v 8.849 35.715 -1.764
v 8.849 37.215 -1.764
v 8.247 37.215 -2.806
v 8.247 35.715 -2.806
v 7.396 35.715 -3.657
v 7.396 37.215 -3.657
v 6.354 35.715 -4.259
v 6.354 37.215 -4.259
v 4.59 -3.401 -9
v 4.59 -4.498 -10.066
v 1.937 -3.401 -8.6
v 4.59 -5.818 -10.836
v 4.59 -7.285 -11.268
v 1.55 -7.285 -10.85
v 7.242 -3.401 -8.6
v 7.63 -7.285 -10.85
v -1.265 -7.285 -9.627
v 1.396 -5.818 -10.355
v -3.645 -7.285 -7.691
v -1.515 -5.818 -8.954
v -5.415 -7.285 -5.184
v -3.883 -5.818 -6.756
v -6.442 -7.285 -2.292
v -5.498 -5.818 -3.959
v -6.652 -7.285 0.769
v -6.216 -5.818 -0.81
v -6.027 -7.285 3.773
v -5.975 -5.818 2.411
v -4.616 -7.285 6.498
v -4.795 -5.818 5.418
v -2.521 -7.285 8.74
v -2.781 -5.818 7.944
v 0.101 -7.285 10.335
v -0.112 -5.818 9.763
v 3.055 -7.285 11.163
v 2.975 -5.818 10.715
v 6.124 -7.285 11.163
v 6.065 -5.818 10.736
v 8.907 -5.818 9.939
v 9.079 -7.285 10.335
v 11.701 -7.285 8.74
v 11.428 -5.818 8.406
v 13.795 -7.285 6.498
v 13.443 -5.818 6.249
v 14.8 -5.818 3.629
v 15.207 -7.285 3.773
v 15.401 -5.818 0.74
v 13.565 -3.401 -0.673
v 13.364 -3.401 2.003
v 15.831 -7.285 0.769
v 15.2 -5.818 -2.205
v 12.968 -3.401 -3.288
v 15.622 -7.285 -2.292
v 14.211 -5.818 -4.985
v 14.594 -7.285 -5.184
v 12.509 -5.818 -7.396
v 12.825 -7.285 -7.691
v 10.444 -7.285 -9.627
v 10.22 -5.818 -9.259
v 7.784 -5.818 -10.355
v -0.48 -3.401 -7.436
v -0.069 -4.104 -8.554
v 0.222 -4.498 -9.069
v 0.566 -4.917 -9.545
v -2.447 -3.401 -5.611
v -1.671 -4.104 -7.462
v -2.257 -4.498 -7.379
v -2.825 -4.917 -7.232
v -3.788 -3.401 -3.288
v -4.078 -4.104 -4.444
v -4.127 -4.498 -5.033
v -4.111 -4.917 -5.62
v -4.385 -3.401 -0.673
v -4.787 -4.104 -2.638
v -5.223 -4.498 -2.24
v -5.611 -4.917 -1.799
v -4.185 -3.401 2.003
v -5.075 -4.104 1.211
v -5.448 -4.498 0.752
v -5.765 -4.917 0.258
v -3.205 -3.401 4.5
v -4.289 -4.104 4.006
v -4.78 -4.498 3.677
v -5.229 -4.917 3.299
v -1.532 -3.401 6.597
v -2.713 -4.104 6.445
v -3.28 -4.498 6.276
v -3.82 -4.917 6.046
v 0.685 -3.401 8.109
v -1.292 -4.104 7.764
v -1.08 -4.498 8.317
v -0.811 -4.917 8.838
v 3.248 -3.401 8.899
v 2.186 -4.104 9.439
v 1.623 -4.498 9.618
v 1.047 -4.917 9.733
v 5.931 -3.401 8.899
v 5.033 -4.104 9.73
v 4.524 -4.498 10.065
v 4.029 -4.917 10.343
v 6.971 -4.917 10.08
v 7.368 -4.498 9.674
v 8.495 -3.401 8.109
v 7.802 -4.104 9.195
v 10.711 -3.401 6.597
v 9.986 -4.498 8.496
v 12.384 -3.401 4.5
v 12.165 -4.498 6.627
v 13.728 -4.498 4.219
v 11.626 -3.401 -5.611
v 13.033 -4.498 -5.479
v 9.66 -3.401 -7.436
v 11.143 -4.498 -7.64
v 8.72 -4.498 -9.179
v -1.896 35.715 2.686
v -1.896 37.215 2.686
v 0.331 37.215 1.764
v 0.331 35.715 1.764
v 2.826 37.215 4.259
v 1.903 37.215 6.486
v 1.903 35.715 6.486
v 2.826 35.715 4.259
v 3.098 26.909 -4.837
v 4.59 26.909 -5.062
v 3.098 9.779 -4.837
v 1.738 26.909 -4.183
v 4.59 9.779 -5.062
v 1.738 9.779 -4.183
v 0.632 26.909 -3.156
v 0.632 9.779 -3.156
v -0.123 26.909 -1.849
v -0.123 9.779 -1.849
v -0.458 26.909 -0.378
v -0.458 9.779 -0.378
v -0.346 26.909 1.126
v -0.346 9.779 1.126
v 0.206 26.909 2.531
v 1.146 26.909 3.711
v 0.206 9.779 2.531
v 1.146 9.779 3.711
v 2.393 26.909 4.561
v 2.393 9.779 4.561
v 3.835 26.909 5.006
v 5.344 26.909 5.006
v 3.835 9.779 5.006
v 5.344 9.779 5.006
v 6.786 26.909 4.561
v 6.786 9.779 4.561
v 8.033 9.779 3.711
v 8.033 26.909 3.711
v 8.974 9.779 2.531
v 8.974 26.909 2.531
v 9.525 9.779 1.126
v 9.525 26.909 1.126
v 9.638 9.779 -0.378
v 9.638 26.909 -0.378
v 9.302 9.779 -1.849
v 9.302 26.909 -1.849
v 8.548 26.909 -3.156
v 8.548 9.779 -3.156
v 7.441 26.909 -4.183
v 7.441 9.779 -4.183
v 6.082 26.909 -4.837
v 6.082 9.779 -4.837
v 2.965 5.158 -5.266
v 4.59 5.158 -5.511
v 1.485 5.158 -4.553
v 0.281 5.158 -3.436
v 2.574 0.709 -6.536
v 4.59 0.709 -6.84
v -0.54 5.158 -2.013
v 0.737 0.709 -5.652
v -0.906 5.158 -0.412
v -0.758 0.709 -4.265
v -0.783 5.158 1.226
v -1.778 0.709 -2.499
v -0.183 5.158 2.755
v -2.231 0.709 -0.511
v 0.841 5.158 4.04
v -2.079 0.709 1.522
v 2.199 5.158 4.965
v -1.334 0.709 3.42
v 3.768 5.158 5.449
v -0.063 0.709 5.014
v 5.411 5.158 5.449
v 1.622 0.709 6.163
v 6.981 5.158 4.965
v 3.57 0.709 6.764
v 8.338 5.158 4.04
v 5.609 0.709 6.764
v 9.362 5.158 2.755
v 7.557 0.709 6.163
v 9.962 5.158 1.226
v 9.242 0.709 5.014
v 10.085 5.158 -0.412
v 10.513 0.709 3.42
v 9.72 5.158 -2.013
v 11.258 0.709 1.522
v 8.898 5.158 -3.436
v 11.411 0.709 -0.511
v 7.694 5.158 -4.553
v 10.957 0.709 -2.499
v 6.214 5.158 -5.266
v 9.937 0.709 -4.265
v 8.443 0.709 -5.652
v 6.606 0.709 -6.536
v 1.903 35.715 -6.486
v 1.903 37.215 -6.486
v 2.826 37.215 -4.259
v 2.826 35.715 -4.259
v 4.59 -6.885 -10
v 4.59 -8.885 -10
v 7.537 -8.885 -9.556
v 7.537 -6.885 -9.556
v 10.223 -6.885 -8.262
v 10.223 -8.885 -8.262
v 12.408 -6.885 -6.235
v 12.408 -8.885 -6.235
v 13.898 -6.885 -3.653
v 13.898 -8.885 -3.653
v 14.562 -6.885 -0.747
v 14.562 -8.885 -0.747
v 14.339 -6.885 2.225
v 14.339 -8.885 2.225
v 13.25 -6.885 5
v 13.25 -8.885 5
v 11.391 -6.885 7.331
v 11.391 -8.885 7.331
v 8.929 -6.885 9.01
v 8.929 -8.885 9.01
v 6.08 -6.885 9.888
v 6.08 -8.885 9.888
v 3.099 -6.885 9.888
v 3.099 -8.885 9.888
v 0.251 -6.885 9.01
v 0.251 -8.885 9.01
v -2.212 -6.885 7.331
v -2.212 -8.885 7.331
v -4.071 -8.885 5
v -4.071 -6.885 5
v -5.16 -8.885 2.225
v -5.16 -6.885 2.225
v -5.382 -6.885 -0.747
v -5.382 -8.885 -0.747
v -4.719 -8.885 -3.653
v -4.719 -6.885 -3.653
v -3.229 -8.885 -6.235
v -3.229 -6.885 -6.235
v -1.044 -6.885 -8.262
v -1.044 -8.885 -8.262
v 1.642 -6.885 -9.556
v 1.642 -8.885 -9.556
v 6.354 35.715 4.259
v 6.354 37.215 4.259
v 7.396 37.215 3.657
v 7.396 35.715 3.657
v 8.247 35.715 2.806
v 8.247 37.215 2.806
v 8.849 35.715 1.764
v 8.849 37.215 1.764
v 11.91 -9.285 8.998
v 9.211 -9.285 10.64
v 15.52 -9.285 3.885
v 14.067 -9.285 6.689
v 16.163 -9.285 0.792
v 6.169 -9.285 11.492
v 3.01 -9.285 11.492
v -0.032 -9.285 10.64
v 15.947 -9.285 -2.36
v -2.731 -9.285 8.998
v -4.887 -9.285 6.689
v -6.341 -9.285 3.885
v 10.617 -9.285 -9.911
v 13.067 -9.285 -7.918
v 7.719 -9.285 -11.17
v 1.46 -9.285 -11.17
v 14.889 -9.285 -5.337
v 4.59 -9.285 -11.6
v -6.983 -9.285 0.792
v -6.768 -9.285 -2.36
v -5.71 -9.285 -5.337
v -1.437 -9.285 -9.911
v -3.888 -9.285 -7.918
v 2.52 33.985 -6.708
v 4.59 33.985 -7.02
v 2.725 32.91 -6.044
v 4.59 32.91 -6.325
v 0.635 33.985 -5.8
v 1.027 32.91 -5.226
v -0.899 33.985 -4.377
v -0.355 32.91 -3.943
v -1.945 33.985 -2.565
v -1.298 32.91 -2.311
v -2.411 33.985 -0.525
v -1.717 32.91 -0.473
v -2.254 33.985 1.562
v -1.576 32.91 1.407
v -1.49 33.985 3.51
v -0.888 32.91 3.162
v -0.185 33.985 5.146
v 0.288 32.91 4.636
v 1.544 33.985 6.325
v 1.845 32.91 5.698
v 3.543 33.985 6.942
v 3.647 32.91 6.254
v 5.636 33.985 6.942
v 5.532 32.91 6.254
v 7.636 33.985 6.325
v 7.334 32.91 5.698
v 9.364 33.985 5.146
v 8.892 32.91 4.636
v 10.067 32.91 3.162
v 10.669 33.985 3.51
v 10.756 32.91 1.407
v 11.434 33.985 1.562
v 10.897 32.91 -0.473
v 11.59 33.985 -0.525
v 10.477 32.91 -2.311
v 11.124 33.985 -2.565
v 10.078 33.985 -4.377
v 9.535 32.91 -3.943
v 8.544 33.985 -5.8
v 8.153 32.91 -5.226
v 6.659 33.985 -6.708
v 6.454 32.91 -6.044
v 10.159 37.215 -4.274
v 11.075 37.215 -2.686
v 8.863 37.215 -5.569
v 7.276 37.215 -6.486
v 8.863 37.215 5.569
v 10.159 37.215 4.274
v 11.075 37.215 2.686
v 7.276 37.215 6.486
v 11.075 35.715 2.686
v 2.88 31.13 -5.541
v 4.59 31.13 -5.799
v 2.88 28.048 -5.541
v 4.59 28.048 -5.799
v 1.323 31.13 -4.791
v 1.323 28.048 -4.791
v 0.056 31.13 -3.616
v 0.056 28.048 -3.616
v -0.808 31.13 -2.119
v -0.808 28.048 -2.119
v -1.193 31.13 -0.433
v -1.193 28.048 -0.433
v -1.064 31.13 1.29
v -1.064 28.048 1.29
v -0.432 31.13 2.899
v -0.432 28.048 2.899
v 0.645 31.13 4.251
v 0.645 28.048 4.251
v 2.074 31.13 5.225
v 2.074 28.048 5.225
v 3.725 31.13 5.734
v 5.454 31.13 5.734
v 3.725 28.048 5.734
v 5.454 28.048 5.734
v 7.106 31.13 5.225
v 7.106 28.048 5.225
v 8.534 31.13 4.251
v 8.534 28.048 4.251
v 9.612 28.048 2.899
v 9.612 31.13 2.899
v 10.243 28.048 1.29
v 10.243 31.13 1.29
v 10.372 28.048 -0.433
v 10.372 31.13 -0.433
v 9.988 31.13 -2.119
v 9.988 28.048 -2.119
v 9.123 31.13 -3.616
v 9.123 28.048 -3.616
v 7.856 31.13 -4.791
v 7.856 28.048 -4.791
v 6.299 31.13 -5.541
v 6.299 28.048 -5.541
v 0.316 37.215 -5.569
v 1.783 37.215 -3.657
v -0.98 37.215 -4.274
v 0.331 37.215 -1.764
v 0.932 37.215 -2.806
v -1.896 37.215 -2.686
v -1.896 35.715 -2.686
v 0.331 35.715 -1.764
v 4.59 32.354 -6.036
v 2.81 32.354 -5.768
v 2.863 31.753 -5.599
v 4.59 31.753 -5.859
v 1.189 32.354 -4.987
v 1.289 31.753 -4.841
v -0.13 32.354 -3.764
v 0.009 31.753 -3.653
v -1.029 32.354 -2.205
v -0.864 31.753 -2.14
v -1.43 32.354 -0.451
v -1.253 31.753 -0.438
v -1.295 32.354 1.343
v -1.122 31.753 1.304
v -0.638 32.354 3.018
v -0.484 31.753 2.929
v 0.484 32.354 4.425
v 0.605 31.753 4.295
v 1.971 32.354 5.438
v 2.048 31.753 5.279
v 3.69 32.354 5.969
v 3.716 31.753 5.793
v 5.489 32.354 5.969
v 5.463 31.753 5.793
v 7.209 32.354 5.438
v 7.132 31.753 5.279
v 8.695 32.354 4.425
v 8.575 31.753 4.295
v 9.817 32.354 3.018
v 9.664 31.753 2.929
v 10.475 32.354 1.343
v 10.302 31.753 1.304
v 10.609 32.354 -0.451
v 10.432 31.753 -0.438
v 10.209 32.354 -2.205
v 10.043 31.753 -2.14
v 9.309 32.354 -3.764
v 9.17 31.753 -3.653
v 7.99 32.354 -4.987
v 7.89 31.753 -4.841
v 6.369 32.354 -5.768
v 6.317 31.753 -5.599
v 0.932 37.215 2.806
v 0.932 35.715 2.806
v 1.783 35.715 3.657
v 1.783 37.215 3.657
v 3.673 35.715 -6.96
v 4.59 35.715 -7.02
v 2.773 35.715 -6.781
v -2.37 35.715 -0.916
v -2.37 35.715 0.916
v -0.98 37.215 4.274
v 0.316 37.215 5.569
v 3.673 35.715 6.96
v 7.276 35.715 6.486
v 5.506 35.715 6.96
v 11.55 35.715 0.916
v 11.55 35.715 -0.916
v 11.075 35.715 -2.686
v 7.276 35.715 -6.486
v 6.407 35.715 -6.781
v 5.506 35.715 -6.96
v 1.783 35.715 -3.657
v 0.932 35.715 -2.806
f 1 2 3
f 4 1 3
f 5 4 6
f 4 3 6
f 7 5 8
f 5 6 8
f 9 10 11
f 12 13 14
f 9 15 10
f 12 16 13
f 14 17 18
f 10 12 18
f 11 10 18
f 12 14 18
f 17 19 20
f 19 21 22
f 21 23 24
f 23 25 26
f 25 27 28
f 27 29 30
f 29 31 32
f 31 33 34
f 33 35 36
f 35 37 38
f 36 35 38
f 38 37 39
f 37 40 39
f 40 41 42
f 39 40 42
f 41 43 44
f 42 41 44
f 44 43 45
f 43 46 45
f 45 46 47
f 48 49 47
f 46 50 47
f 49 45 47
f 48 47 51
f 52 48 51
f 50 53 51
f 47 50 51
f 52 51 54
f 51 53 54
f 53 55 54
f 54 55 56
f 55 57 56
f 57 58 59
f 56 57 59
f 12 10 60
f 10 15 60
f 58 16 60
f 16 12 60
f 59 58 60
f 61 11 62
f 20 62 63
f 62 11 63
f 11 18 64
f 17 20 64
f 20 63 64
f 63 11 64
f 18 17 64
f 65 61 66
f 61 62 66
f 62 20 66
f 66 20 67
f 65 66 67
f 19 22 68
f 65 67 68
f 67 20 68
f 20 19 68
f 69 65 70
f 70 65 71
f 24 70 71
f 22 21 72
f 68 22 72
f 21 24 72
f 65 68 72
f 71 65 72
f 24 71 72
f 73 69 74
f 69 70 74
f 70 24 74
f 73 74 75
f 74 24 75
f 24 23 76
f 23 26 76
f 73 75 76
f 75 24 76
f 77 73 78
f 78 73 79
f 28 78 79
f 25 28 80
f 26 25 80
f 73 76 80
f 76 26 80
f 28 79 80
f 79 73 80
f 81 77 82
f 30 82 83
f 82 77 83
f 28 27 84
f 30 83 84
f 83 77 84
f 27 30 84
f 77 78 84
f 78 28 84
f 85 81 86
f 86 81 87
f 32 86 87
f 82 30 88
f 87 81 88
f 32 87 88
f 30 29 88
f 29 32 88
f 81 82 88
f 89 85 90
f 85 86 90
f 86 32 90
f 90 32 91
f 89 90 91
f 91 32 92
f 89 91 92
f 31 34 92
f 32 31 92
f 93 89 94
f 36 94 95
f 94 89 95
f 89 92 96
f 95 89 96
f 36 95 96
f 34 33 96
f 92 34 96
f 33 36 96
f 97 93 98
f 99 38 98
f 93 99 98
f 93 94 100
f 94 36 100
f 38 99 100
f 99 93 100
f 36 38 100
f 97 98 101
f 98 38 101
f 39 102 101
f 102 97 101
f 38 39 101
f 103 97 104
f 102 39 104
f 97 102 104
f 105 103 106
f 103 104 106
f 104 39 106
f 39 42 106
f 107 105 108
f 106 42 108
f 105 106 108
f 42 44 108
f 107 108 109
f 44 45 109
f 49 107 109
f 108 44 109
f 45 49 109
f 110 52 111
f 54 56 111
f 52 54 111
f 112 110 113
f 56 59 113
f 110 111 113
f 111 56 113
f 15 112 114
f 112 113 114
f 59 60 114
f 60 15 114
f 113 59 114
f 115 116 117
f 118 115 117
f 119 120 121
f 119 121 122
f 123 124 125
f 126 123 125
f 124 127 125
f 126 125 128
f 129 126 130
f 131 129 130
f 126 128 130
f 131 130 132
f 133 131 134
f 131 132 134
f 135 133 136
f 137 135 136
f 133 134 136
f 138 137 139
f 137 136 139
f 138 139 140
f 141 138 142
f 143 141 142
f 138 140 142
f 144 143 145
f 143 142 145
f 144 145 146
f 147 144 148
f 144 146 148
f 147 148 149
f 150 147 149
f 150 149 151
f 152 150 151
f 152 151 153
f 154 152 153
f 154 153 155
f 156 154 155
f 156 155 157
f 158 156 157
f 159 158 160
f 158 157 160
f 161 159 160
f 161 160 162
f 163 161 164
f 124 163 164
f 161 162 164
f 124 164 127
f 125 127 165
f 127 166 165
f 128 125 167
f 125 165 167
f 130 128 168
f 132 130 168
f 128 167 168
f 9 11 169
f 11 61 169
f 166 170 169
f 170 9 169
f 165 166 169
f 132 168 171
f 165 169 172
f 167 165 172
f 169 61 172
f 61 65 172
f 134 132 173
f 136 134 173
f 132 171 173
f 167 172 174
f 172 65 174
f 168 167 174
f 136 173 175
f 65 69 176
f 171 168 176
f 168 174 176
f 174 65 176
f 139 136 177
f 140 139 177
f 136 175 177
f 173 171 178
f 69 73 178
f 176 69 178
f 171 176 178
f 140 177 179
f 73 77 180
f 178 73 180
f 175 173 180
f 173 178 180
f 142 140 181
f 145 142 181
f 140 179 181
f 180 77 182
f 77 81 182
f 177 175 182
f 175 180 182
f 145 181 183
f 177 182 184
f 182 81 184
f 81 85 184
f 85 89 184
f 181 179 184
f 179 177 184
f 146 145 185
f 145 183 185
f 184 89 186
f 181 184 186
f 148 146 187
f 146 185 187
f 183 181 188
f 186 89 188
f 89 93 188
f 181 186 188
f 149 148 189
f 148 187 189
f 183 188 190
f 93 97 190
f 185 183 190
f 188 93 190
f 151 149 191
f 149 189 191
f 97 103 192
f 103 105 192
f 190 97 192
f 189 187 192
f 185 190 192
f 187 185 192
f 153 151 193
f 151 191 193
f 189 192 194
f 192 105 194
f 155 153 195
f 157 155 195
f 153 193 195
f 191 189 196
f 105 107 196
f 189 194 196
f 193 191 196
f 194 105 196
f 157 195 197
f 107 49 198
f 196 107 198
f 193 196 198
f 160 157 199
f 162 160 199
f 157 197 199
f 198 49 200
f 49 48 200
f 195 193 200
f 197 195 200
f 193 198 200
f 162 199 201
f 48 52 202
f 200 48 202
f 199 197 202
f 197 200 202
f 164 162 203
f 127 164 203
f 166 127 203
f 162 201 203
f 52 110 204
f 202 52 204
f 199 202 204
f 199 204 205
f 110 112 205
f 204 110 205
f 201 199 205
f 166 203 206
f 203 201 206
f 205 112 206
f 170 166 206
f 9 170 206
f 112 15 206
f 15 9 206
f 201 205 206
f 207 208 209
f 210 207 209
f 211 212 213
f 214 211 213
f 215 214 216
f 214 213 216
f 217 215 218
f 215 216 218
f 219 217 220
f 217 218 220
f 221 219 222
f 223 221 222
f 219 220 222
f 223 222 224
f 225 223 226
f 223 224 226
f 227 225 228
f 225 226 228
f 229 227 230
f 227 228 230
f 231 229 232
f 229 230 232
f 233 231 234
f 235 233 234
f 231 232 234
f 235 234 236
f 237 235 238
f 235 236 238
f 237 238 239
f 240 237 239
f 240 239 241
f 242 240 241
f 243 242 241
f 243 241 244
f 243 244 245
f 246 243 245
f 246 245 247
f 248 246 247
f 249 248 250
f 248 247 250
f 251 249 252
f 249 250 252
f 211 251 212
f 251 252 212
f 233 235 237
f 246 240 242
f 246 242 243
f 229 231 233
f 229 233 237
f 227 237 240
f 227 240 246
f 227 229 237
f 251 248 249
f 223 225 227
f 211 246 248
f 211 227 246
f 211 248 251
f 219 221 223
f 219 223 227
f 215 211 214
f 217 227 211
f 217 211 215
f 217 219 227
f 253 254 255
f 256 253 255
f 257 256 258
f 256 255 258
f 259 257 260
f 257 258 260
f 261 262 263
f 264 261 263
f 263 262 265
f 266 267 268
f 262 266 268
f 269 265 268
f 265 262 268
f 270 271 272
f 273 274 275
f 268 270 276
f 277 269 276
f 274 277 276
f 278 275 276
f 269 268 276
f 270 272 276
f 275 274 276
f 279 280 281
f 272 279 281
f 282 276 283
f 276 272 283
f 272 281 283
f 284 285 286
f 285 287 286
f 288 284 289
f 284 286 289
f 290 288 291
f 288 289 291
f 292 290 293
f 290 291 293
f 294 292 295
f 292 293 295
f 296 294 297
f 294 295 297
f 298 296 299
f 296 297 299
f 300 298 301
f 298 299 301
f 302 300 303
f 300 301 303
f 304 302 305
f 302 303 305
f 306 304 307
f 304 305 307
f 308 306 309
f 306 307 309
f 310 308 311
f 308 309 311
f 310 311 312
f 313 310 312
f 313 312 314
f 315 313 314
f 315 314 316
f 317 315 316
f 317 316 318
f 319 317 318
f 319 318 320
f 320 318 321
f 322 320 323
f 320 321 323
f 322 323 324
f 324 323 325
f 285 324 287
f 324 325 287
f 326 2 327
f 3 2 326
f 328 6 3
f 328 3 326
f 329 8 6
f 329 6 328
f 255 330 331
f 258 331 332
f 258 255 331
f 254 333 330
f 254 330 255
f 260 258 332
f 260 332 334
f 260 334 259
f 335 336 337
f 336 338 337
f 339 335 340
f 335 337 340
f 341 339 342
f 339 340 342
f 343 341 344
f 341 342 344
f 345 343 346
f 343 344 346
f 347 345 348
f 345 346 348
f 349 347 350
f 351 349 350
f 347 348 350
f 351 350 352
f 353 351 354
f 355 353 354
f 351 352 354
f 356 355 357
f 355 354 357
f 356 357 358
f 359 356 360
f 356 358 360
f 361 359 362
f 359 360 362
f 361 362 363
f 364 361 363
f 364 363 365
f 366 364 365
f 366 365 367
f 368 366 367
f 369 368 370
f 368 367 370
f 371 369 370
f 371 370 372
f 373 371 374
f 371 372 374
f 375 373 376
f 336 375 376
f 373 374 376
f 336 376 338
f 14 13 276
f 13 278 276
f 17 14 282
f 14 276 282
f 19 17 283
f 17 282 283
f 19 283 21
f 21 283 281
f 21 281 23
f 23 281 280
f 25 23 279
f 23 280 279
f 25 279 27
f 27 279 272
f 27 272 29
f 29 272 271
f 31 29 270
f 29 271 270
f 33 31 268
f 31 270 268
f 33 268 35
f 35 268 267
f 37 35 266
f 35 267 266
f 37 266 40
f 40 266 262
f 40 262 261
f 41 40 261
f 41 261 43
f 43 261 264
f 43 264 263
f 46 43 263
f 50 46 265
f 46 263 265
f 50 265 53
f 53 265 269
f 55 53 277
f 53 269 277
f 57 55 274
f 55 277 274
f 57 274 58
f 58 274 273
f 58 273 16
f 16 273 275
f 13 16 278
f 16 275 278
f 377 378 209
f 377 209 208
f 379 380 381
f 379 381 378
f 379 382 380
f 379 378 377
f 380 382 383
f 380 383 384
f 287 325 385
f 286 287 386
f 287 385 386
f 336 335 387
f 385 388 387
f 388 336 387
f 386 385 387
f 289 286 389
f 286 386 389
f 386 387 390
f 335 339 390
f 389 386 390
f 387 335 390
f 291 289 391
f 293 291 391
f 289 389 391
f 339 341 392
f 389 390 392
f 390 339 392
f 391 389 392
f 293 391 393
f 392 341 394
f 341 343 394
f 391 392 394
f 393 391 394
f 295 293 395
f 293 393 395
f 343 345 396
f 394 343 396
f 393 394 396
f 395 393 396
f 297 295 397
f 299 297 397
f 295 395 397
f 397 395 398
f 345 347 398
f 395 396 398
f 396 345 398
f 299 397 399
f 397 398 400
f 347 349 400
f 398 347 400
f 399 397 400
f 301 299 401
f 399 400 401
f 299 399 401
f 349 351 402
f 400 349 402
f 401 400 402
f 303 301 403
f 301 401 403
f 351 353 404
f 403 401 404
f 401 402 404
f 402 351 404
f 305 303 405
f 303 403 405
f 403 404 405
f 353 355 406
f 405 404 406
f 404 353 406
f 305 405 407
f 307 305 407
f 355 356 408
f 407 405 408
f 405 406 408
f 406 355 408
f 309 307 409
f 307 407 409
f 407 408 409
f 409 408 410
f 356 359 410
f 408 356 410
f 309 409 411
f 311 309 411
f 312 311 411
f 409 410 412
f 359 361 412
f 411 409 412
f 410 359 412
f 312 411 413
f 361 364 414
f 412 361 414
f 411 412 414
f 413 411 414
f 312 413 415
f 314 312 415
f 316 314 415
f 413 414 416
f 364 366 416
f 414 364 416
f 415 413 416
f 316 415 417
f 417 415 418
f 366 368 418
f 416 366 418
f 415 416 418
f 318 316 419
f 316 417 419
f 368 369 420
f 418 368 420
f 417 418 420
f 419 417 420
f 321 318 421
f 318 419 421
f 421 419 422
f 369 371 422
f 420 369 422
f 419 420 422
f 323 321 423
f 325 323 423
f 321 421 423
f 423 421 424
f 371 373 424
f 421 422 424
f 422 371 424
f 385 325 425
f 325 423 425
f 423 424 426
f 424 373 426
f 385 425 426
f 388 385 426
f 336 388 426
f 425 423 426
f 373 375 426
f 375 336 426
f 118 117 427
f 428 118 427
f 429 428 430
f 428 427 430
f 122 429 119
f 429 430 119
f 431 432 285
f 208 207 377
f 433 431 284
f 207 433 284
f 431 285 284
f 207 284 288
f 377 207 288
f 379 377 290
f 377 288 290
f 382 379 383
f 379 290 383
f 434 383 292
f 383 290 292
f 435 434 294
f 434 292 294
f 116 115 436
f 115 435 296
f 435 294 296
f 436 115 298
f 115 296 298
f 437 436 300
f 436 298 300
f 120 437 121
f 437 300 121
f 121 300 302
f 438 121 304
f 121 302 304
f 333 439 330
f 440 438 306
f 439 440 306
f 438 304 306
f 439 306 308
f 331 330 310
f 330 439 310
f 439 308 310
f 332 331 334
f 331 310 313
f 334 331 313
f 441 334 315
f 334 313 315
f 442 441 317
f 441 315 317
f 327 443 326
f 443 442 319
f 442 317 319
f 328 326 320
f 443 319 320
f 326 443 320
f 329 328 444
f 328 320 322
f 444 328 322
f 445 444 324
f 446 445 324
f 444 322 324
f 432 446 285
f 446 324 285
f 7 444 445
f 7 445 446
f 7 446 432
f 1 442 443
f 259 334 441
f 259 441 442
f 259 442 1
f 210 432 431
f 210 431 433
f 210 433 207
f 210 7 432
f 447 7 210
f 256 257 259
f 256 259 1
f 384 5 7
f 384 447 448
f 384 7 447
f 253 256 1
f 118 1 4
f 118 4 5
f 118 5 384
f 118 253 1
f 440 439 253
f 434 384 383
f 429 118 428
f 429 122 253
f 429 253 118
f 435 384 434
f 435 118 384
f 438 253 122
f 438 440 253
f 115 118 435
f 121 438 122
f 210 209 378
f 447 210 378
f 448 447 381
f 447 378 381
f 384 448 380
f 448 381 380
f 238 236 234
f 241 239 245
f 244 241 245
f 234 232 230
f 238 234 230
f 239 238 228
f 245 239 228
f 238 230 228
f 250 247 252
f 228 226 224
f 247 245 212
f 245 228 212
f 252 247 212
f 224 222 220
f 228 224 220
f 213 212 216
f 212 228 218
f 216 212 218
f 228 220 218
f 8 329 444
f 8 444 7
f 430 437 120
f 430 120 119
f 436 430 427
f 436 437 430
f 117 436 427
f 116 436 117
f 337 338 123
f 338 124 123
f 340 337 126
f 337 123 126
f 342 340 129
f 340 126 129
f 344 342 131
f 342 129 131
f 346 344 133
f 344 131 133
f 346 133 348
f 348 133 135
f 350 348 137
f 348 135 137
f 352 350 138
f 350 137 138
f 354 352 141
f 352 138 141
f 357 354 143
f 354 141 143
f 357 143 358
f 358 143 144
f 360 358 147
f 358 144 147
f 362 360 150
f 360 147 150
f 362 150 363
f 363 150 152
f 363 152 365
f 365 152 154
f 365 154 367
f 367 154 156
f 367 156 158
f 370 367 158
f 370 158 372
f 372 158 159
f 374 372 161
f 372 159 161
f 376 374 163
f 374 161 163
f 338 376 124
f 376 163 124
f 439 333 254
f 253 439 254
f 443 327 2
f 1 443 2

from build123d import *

# Parameters (mm, degrees)
SKETCH1_3_W        = 2.41
SKETCH1_3_H        = 1.5
CUT_REVOLVE1_ANGLE = 45
CIRPATTERN1_COUNT  = 4
CUT_EXTRUDE1_START = -0.4
SKETCH2_R          = 10
CUT_EXTRUDE1_DEPTH = 2


with BuildPart() as part:
    # Sketch1 → Revolve5 (revolve)
    with BuildSketch(Plane.XY):
        with BuildLine():
            Line((-7.010318738, -9.284917782), (4.589681262, -9.284917782))
            Line((4.589681262, -9.284917782), (4.589681262, 35.715082218))
            Line((4.589681262, 35.715082218), (-0.020318738, 35.715082218))
            Line((-0.020318738, 35.715082218), (-0.020318738, 37.215082218))
            Line((-0.020318738, 37.215082218), (-2.430318738, 37.215082218))
            Line((-2.430318738, 37.215082218), (-2.430318738, 33.985082218))
            Line((-2.430318738, 33.985082218), (-1.735040384, 32.910378534))
            ThreePointArc((-1.735040384, 32.910378534), (-1.343438221, 32.058018495), (-1.209241973, 31.129653665))
            Line((-1.209241973, 31.129653665), (-1.209241973, 28.047788417))
            Line((-1.209241973, 28.047788417), (-0.472655293, 26.909233745))
            Line((-0.472655293, 26.909233745), (-0.472655293, 9.778863627))
            ThreePointArc((-0.472655293, 9.778863627), (-1.478108998, 2.901044306), (-4.410318738, -3.401136412))
            ThreePointArc((-4.410318738, -3.401136412), (-5.901404916, -5.134443013), (-6.678030973, -7.284917782))
            Line((-6.678030973, -7.284917782), (-7.010318738, -9.284917782))
        make_face()
    revolve(axis=Axis((4.589681262, -9.284917782, 0), (0, 1, 0)))

    # Sketch1<3> → Cut-Revolve1 (revolve, symmetric, cut)
    with BuildSketch(Plane.XY) as cut_revolve1_sk:
        with Locations((-1.225318738, 36.465082218)):
            Rectangle(SKETCH1_3_W, SKETCH1_3_H)
    cut_revolve1 = revolve(axis=Axis((4.589681262, -9.284917782, 0), (0, 1, 0)), revolution_arc=CUT_REVOLVE1_ANGLE / 2, mode=Mode.SUBTRACT)
    cut_revolve1 = cut_revolve1 + revolve(cut_revolve1_sk.sketch, axis=Axis((4.589681262, -9.284917782, 0), (0, -1, 0)), revolution_arc=CUT_REVOLVE1_ANGLE / 2, mode=Mode.SUBTRACT)

    # CirPattern1: Cut-Revolve1 ×4 about axis
    cirpattern1_axis = Axis((4.589681262, -9.284917782, 0), (0, 1, 0))
    for i in range(1, CIRPATTERN1_COUNT):
        add(cut_revolve1.rotate(cirpattern1_axis, i * 360 / CIRPATTERN1_COUNT), mode=Mode.SUBTRACT)

    # Sketch2 → Cut-Extrude1 (cut)
    with BuildSketch(Plane.XZ.offset(9.284917782).offset(CUT_EXTRUDE1_START)):
        with Locations((4.589681262, 0)):
            Circle(SKETCH2_R)
    extrude(amount=-CUT_EXTRUDE1_DEPTH, mode=Mode.SUBTRACT)


solid = part.part
